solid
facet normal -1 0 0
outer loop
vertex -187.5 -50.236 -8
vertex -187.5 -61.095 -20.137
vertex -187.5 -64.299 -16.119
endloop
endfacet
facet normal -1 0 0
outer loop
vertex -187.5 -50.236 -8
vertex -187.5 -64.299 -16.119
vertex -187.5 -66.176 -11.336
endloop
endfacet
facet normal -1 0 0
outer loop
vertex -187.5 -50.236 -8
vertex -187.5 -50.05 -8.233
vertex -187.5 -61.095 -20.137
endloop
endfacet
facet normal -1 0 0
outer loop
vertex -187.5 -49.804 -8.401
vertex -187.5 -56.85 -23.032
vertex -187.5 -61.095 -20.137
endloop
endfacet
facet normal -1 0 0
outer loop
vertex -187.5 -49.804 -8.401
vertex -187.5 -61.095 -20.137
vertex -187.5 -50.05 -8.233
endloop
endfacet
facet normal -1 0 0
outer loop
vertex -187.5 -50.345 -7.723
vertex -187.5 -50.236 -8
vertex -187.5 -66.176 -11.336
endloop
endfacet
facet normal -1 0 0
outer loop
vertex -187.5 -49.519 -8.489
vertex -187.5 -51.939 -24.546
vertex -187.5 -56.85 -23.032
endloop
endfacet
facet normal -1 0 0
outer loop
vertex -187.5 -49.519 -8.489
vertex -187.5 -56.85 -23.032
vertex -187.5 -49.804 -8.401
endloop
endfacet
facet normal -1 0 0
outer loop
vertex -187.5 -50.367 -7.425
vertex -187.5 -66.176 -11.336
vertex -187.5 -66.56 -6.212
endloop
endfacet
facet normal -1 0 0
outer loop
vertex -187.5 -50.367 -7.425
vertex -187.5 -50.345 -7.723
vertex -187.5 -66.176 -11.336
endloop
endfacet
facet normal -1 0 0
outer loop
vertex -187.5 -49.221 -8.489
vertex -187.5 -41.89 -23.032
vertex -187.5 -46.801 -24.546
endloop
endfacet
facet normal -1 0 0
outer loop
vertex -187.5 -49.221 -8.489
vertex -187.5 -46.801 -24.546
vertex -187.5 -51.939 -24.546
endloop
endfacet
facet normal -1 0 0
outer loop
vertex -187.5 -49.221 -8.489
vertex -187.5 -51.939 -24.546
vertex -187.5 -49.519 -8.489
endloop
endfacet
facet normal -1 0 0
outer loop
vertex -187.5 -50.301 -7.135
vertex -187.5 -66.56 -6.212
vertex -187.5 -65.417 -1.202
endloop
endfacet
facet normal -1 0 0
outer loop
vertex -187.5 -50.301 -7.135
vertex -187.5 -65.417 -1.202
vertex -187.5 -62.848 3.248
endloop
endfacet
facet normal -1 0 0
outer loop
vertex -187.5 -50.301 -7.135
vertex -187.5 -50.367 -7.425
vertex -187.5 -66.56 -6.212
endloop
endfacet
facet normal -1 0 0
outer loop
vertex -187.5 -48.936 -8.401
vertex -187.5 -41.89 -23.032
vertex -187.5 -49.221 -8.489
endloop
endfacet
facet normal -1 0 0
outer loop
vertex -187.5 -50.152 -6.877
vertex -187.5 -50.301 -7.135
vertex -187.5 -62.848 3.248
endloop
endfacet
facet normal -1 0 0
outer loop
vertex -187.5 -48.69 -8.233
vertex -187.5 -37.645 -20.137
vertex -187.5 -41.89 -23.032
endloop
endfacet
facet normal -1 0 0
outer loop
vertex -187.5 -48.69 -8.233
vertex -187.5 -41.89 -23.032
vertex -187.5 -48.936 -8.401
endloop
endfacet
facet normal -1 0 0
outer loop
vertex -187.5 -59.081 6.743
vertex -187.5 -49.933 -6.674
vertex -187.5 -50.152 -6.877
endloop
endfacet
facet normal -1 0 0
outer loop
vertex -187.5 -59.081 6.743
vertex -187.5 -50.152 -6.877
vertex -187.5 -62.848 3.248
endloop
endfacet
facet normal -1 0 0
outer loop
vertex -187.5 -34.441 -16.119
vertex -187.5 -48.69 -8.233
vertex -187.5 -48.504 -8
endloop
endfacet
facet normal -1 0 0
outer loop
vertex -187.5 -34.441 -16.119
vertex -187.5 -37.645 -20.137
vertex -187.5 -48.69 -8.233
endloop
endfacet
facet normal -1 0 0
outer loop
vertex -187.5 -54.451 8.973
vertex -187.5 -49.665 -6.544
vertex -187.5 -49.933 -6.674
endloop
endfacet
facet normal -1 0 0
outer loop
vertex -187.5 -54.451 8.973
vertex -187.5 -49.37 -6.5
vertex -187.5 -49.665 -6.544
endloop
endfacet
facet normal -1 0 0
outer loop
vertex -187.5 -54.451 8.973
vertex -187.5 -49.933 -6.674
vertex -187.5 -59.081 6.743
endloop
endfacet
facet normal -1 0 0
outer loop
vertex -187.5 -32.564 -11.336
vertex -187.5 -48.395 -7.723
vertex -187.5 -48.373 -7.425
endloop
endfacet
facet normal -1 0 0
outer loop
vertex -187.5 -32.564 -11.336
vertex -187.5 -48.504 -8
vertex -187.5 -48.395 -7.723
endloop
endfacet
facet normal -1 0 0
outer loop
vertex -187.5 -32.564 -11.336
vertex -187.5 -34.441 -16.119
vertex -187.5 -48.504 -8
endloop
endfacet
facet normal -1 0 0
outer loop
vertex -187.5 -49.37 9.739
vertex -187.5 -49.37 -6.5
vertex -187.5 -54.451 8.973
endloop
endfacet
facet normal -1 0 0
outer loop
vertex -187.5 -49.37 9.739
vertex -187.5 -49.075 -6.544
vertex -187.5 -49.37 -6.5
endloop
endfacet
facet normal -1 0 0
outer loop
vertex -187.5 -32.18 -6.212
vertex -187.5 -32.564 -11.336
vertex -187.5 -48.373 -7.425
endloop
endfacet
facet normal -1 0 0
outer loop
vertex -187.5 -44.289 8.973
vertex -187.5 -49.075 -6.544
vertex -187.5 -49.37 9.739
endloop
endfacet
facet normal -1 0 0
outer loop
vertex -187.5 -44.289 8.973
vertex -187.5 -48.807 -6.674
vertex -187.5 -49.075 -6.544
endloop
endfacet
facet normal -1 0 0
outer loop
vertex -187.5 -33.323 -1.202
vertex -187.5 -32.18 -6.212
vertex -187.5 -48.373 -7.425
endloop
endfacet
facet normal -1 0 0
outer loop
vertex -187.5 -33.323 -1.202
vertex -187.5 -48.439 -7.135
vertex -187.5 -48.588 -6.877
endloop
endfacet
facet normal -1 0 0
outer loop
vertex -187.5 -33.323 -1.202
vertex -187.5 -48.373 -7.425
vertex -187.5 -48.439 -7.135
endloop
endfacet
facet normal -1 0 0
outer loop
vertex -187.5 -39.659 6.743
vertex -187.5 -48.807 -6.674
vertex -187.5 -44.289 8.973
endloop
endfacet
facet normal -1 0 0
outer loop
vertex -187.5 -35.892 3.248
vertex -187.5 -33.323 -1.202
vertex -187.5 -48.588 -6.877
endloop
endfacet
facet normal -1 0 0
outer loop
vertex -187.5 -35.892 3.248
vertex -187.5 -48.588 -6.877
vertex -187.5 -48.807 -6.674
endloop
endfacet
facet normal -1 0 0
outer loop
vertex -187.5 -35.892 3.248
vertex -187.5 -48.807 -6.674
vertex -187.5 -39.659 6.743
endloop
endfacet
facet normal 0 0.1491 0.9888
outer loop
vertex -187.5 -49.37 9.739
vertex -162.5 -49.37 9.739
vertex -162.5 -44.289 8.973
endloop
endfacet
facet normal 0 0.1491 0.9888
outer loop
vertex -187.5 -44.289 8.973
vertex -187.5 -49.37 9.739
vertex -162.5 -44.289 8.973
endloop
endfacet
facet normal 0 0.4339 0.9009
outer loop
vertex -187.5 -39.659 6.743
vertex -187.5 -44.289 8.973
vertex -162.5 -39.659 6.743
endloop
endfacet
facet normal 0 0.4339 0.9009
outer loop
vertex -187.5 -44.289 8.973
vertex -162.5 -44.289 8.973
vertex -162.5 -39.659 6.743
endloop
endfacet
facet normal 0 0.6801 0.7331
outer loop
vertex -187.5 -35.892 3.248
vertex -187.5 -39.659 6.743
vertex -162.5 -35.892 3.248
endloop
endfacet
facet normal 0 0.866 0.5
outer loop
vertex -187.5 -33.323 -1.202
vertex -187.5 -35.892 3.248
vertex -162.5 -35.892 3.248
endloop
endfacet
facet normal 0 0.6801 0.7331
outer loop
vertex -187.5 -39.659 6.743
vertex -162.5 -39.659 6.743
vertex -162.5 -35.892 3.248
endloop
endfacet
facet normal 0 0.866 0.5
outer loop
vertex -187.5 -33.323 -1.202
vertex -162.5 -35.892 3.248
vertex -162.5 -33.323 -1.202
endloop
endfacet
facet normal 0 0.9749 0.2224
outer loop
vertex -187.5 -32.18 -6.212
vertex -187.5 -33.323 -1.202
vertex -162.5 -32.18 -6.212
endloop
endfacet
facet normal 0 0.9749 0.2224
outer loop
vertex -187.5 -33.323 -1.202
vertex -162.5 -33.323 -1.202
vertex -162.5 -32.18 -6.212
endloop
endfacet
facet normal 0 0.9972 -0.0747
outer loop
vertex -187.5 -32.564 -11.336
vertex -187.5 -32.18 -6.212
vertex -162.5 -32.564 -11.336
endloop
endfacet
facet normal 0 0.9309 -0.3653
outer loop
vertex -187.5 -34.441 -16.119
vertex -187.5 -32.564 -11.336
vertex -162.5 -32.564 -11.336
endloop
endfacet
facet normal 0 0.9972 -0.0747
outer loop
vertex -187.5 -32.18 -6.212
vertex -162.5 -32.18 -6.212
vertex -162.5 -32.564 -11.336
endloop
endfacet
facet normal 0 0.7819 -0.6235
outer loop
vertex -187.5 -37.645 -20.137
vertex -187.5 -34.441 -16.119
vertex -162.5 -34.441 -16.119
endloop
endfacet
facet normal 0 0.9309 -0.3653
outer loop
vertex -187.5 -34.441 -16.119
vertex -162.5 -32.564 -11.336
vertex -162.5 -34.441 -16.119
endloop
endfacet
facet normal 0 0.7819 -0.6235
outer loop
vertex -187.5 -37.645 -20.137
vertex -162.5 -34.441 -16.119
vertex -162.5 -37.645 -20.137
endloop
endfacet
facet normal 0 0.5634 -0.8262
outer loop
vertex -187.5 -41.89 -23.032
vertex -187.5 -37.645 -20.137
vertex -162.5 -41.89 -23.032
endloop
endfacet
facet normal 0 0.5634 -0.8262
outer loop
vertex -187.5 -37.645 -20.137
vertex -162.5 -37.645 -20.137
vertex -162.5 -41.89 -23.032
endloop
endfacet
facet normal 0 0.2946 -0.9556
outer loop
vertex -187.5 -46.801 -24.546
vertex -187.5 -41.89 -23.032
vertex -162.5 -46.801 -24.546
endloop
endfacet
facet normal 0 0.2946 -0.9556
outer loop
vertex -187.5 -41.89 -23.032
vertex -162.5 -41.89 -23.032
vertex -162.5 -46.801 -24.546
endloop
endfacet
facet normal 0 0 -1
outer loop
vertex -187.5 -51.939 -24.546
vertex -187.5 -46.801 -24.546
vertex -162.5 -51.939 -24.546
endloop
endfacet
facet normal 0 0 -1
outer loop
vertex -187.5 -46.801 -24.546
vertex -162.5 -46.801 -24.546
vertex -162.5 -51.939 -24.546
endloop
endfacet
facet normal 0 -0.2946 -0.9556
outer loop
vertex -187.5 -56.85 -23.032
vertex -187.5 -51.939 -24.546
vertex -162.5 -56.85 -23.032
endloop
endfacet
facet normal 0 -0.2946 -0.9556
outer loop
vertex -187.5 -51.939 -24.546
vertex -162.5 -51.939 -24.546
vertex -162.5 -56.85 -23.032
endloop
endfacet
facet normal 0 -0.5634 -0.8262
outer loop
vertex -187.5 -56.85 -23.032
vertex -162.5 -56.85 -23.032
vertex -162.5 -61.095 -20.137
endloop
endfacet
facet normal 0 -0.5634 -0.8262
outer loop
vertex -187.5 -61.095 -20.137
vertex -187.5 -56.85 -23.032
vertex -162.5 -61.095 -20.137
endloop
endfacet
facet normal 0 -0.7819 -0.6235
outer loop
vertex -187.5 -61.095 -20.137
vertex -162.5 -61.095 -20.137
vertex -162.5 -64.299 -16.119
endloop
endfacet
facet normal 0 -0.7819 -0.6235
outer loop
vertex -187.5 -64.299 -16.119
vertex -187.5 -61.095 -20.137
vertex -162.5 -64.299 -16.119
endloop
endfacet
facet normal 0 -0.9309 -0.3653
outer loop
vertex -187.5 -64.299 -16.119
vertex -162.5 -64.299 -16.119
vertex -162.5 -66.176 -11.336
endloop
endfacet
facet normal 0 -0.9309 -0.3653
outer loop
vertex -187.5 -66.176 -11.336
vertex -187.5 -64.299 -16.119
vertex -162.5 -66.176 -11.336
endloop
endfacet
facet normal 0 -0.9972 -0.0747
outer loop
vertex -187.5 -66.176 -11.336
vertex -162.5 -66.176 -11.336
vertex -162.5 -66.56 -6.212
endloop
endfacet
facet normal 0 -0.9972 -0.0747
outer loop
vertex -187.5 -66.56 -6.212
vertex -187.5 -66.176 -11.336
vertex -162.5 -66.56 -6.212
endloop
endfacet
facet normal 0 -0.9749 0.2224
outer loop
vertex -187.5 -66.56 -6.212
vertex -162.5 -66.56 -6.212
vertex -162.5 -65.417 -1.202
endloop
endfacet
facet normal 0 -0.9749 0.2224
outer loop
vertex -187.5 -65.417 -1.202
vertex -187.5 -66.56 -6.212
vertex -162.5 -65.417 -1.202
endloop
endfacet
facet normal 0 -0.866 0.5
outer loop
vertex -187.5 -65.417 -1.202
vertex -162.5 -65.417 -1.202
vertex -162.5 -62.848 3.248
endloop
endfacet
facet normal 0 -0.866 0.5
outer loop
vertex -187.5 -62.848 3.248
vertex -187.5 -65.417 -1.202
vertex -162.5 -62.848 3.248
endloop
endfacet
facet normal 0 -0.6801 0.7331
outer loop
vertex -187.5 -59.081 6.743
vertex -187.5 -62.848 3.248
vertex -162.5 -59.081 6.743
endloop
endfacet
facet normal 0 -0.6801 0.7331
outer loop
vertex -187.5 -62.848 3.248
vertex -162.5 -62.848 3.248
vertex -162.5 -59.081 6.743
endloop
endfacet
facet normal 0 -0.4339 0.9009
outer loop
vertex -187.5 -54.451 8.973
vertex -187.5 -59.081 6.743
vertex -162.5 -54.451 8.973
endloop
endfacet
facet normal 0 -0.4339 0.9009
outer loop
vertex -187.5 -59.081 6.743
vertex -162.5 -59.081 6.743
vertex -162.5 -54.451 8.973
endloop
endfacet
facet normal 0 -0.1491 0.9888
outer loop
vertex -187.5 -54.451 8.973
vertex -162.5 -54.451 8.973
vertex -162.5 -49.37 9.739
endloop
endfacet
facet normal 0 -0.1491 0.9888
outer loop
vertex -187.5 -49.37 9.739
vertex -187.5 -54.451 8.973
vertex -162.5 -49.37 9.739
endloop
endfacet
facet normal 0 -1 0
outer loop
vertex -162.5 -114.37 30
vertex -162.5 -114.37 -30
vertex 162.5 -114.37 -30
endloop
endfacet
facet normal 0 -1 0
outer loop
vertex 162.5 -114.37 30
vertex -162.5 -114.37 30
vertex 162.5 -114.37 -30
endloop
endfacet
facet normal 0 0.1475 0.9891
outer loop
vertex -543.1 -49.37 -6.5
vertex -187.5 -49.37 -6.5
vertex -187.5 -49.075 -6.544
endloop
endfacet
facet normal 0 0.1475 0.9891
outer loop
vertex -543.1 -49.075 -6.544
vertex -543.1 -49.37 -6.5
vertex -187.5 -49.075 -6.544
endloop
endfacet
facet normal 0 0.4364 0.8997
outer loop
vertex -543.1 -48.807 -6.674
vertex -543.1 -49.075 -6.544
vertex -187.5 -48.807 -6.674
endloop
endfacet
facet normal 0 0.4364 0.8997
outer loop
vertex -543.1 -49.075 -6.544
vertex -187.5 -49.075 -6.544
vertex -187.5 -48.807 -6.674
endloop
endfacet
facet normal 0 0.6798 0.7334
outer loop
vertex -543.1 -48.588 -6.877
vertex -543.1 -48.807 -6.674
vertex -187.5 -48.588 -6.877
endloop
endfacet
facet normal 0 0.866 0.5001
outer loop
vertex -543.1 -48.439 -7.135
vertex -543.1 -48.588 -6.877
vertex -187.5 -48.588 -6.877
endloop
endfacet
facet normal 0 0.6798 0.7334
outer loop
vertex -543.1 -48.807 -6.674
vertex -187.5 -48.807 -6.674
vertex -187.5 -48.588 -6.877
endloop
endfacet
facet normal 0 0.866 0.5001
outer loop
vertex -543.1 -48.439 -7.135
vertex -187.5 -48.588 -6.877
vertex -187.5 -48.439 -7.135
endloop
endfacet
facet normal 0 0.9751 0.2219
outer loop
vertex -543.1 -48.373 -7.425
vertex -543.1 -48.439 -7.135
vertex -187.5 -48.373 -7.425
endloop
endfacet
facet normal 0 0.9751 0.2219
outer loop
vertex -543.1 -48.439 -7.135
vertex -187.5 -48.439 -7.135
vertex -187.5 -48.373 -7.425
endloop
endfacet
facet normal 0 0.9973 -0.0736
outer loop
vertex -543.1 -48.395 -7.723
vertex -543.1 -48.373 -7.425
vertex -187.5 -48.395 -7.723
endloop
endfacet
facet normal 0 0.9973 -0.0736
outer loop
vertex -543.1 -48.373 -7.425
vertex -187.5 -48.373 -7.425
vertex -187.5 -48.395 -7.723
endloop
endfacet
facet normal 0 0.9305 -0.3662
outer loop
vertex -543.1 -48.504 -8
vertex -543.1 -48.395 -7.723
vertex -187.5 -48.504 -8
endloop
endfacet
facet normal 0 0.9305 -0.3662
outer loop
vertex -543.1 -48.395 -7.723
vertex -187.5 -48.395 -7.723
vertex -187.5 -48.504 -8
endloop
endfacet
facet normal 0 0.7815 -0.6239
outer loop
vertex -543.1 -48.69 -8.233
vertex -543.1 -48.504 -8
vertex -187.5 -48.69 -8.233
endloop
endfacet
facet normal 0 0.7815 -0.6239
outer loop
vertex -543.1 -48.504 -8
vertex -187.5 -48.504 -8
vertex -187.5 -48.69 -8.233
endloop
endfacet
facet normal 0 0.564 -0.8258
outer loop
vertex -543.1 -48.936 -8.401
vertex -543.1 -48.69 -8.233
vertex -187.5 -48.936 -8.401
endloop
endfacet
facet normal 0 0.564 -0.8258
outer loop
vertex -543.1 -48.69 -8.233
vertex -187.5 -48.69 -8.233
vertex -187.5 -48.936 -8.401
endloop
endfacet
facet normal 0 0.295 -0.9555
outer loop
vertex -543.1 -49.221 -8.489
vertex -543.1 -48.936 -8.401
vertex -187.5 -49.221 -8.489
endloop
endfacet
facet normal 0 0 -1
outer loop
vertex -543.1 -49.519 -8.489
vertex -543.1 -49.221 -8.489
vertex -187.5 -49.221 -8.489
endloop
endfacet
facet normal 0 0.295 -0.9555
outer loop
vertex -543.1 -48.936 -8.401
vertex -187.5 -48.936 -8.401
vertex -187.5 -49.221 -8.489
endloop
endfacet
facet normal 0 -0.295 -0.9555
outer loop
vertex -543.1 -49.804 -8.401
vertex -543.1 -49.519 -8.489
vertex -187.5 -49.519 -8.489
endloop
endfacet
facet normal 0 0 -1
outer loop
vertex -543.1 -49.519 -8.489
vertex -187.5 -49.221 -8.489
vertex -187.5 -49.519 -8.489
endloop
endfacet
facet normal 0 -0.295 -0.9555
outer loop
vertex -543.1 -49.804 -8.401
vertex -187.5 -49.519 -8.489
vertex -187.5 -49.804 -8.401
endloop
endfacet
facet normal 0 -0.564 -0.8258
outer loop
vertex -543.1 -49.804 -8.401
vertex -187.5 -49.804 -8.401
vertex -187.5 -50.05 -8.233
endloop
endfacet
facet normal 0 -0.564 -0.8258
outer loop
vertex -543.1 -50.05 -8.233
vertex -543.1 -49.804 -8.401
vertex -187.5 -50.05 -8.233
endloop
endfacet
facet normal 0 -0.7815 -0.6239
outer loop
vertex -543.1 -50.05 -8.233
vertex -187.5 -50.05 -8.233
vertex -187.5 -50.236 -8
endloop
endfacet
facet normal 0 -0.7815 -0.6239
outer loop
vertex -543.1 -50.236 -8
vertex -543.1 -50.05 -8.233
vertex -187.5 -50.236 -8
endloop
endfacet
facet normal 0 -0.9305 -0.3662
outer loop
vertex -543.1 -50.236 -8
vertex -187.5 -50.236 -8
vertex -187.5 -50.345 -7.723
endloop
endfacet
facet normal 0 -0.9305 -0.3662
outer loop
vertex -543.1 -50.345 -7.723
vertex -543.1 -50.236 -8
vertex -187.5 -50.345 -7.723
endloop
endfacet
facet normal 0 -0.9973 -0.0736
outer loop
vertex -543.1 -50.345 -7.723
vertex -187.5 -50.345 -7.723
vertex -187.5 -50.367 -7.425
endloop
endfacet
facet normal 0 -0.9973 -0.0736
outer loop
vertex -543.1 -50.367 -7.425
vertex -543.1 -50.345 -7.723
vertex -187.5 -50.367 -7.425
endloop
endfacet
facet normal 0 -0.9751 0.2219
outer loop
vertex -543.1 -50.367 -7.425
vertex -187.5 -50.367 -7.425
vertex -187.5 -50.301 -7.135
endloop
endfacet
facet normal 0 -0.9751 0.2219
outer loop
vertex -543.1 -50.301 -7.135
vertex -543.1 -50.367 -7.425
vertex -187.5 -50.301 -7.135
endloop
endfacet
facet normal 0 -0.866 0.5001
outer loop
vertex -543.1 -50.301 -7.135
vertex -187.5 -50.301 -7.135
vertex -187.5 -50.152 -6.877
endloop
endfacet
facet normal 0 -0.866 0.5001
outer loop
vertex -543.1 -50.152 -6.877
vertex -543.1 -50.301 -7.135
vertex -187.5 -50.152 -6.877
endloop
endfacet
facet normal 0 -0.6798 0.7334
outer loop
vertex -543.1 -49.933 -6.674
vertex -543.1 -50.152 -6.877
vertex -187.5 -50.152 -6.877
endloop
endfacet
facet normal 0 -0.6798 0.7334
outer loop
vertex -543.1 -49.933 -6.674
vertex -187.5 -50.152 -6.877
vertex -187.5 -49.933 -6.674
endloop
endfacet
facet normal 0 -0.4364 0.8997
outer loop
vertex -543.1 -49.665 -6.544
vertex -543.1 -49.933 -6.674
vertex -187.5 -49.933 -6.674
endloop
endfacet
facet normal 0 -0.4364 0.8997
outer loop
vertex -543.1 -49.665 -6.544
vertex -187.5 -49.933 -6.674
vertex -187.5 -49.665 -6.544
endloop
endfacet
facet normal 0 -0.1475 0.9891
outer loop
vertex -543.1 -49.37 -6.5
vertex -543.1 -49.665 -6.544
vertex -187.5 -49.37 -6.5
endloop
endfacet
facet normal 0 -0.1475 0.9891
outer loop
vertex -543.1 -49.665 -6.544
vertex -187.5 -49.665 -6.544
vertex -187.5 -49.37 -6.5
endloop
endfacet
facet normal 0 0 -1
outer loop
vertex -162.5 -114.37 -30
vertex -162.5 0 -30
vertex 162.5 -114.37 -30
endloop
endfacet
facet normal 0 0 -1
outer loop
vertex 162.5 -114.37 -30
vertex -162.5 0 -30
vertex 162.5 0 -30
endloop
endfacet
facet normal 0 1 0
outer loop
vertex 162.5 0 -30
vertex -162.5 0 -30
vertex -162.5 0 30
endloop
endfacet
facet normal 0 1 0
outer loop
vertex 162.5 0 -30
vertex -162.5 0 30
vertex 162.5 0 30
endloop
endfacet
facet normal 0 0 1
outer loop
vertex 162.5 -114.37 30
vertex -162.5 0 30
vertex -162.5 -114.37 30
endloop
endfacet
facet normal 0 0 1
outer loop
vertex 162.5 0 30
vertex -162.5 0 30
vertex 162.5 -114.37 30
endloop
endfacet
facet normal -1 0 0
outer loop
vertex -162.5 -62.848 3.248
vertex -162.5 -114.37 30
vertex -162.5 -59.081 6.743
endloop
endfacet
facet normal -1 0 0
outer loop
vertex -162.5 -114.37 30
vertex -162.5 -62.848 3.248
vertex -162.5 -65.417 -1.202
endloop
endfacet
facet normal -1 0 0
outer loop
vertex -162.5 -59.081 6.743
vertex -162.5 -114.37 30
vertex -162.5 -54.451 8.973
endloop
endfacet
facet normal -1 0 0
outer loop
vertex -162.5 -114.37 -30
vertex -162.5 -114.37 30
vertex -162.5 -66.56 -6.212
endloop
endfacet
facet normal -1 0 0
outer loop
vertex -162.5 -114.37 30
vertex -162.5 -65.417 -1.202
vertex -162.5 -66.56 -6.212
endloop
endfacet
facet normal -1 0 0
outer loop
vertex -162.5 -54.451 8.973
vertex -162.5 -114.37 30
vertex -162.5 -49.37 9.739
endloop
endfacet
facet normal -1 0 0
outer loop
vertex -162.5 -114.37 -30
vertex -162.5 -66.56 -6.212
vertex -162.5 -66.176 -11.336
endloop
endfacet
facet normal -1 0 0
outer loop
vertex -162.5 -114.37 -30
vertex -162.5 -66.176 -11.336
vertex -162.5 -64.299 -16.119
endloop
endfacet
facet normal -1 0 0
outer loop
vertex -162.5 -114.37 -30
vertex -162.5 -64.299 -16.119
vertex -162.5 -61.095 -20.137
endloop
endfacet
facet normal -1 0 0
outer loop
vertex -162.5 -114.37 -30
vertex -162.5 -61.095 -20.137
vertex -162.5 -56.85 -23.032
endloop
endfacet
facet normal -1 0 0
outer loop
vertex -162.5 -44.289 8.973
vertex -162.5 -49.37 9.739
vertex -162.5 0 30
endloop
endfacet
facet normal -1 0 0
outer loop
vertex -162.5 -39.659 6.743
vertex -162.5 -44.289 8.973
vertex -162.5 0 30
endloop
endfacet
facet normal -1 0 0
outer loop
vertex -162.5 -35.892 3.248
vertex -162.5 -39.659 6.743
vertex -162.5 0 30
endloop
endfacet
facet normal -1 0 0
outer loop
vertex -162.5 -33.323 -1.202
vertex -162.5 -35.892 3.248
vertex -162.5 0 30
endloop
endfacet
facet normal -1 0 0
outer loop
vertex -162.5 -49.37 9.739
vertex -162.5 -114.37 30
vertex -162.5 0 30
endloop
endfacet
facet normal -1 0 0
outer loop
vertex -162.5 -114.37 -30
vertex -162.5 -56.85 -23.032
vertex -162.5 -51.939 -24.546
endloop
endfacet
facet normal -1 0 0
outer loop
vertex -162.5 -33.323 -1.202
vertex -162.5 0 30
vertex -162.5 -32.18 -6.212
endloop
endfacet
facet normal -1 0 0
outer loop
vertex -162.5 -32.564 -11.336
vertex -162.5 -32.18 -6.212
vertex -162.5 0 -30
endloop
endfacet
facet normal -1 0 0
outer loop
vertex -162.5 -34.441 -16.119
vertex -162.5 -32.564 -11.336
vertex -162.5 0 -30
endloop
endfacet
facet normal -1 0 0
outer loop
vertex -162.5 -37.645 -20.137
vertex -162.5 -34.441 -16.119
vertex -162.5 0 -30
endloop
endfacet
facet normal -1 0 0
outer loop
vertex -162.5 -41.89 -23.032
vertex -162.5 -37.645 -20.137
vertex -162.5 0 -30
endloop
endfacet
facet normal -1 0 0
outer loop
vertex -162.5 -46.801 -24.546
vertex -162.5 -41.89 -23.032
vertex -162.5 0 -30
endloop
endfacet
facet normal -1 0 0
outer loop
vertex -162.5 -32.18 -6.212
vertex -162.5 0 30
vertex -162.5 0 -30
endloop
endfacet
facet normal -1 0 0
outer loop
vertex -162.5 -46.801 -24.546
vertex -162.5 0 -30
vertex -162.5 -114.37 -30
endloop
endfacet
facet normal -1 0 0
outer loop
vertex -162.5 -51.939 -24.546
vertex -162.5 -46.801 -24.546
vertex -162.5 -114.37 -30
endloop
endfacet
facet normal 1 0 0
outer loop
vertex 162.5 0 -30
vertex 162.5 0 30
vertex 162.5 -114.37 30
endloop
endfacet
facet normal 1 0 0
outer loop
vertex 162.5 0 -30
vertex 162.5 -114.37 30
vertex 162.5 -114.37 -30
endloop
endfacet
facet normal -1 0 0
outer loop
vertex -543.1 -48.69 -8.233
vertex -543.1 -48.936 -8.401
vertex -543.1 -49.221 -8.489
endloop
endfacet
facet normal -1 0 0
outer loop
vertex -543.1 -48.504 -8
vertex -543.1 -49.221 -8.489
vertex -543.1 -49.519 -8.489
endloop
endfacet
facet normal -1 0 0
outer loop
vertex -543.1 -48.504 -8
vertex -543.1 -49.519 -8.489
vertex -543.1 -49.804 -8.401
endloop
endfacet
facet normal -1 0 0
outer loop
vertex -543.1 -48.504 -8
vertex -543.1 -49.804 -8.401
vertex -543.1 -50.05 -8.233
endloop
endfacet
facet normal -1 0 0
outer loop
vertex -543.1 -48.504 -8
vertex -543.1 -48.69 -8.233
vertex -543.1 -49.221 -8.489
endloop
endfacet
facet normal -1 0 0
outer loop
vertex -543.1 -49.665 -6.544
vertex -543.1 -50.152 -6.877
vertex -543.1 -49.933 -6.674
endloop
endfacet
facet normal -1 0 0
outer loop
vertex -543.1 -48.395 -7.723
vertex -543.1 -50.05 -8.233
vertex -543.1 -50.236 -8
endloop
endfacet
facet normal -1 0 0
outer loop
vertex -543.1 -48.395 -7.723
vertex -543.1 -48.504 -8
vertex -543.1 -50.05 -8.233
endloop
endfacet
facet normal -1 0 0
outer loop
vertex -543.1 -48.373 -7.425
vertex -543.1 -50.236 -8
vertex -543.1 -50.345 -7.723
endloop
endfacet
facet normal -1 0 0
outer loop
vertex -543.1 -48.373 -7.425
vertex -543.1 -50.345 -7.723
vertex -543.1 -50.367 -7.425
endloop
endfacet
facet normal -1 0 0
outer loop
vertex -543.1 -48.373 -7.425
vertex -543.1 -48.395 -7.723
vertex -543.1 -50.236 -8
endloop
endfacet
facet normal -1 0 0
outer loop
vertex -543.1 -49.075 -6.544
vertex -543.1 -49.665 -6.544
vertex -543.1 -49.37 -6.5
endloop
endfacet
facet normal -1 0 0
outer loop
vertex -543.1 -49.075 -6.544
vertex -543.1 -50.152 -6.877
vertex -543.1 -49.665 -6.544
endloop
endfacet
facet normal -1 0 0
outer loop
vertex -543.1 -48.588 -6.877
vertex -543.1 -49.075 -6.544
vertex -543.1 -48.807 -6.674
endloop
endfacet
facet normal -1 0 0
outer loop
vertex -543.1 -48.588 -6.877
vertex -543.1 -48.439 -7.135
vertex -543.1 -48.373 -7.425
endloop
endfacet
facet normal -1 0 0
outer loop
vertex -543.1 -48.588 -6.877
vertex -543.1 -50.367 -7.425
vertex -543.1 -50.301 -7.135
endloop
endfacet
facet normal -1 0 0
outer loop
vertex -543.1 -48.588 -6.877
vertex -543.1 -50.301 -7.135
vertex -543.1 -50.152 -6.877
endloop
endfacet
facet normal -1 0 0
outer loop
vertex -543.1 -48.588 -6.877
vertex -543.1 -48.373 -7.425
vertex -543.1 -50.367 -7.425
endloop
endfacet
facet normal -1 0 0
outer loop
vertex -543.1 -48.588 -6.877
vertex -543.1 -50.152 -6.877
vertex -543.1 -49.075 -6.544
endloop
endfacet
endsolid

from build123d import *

# Parameters (mm, degrees)
SKETCH1_W           = 325
SKETCH1_H           = 60
BOSS_EXTRUDE1_DEPTH = 114.37
SKETCH2_R           = 17.238668945
BOSS_EXTRUDE2_DEPTH = 25
SKETCH3_R           = 1
BOSS_EXTRUDE3_DEPTH = 355.6


with BuildPart() as part:
    # Sketch1 → Boss-Extrude1 (new body)
    with BuildSketch(Plane(origin=(0, 0, 0), x_dir=(1, 0, 0), z_dir=(0, 1, 0))):
        Rectangle(SKETCH1_W, SKETCH1_H)
    extrude(amount=-BOSS_EXTRUDE1_DEPTH)

    # Sketch2 → Boss-Extrude2 (add)
    with BuildSketch(Plane.ZY.offset(162.5)):
        with Locations((-7.5, -49.37)):
            Circle(SKETCH2_R)
    extrude(amount=BOSS_EXTRUDE2_DEPTH)

    # Sketch3 → Boss-Extrude3 (add)
    with BuildSketch(Plane.ZY.offset(187.5)):
        with Locations((-7.5, -49.37)):
            Circle(SKETCH3_R)
    extrude(amount=BOSS_EXTRUDE3_DEPTH)


solid = part.part
